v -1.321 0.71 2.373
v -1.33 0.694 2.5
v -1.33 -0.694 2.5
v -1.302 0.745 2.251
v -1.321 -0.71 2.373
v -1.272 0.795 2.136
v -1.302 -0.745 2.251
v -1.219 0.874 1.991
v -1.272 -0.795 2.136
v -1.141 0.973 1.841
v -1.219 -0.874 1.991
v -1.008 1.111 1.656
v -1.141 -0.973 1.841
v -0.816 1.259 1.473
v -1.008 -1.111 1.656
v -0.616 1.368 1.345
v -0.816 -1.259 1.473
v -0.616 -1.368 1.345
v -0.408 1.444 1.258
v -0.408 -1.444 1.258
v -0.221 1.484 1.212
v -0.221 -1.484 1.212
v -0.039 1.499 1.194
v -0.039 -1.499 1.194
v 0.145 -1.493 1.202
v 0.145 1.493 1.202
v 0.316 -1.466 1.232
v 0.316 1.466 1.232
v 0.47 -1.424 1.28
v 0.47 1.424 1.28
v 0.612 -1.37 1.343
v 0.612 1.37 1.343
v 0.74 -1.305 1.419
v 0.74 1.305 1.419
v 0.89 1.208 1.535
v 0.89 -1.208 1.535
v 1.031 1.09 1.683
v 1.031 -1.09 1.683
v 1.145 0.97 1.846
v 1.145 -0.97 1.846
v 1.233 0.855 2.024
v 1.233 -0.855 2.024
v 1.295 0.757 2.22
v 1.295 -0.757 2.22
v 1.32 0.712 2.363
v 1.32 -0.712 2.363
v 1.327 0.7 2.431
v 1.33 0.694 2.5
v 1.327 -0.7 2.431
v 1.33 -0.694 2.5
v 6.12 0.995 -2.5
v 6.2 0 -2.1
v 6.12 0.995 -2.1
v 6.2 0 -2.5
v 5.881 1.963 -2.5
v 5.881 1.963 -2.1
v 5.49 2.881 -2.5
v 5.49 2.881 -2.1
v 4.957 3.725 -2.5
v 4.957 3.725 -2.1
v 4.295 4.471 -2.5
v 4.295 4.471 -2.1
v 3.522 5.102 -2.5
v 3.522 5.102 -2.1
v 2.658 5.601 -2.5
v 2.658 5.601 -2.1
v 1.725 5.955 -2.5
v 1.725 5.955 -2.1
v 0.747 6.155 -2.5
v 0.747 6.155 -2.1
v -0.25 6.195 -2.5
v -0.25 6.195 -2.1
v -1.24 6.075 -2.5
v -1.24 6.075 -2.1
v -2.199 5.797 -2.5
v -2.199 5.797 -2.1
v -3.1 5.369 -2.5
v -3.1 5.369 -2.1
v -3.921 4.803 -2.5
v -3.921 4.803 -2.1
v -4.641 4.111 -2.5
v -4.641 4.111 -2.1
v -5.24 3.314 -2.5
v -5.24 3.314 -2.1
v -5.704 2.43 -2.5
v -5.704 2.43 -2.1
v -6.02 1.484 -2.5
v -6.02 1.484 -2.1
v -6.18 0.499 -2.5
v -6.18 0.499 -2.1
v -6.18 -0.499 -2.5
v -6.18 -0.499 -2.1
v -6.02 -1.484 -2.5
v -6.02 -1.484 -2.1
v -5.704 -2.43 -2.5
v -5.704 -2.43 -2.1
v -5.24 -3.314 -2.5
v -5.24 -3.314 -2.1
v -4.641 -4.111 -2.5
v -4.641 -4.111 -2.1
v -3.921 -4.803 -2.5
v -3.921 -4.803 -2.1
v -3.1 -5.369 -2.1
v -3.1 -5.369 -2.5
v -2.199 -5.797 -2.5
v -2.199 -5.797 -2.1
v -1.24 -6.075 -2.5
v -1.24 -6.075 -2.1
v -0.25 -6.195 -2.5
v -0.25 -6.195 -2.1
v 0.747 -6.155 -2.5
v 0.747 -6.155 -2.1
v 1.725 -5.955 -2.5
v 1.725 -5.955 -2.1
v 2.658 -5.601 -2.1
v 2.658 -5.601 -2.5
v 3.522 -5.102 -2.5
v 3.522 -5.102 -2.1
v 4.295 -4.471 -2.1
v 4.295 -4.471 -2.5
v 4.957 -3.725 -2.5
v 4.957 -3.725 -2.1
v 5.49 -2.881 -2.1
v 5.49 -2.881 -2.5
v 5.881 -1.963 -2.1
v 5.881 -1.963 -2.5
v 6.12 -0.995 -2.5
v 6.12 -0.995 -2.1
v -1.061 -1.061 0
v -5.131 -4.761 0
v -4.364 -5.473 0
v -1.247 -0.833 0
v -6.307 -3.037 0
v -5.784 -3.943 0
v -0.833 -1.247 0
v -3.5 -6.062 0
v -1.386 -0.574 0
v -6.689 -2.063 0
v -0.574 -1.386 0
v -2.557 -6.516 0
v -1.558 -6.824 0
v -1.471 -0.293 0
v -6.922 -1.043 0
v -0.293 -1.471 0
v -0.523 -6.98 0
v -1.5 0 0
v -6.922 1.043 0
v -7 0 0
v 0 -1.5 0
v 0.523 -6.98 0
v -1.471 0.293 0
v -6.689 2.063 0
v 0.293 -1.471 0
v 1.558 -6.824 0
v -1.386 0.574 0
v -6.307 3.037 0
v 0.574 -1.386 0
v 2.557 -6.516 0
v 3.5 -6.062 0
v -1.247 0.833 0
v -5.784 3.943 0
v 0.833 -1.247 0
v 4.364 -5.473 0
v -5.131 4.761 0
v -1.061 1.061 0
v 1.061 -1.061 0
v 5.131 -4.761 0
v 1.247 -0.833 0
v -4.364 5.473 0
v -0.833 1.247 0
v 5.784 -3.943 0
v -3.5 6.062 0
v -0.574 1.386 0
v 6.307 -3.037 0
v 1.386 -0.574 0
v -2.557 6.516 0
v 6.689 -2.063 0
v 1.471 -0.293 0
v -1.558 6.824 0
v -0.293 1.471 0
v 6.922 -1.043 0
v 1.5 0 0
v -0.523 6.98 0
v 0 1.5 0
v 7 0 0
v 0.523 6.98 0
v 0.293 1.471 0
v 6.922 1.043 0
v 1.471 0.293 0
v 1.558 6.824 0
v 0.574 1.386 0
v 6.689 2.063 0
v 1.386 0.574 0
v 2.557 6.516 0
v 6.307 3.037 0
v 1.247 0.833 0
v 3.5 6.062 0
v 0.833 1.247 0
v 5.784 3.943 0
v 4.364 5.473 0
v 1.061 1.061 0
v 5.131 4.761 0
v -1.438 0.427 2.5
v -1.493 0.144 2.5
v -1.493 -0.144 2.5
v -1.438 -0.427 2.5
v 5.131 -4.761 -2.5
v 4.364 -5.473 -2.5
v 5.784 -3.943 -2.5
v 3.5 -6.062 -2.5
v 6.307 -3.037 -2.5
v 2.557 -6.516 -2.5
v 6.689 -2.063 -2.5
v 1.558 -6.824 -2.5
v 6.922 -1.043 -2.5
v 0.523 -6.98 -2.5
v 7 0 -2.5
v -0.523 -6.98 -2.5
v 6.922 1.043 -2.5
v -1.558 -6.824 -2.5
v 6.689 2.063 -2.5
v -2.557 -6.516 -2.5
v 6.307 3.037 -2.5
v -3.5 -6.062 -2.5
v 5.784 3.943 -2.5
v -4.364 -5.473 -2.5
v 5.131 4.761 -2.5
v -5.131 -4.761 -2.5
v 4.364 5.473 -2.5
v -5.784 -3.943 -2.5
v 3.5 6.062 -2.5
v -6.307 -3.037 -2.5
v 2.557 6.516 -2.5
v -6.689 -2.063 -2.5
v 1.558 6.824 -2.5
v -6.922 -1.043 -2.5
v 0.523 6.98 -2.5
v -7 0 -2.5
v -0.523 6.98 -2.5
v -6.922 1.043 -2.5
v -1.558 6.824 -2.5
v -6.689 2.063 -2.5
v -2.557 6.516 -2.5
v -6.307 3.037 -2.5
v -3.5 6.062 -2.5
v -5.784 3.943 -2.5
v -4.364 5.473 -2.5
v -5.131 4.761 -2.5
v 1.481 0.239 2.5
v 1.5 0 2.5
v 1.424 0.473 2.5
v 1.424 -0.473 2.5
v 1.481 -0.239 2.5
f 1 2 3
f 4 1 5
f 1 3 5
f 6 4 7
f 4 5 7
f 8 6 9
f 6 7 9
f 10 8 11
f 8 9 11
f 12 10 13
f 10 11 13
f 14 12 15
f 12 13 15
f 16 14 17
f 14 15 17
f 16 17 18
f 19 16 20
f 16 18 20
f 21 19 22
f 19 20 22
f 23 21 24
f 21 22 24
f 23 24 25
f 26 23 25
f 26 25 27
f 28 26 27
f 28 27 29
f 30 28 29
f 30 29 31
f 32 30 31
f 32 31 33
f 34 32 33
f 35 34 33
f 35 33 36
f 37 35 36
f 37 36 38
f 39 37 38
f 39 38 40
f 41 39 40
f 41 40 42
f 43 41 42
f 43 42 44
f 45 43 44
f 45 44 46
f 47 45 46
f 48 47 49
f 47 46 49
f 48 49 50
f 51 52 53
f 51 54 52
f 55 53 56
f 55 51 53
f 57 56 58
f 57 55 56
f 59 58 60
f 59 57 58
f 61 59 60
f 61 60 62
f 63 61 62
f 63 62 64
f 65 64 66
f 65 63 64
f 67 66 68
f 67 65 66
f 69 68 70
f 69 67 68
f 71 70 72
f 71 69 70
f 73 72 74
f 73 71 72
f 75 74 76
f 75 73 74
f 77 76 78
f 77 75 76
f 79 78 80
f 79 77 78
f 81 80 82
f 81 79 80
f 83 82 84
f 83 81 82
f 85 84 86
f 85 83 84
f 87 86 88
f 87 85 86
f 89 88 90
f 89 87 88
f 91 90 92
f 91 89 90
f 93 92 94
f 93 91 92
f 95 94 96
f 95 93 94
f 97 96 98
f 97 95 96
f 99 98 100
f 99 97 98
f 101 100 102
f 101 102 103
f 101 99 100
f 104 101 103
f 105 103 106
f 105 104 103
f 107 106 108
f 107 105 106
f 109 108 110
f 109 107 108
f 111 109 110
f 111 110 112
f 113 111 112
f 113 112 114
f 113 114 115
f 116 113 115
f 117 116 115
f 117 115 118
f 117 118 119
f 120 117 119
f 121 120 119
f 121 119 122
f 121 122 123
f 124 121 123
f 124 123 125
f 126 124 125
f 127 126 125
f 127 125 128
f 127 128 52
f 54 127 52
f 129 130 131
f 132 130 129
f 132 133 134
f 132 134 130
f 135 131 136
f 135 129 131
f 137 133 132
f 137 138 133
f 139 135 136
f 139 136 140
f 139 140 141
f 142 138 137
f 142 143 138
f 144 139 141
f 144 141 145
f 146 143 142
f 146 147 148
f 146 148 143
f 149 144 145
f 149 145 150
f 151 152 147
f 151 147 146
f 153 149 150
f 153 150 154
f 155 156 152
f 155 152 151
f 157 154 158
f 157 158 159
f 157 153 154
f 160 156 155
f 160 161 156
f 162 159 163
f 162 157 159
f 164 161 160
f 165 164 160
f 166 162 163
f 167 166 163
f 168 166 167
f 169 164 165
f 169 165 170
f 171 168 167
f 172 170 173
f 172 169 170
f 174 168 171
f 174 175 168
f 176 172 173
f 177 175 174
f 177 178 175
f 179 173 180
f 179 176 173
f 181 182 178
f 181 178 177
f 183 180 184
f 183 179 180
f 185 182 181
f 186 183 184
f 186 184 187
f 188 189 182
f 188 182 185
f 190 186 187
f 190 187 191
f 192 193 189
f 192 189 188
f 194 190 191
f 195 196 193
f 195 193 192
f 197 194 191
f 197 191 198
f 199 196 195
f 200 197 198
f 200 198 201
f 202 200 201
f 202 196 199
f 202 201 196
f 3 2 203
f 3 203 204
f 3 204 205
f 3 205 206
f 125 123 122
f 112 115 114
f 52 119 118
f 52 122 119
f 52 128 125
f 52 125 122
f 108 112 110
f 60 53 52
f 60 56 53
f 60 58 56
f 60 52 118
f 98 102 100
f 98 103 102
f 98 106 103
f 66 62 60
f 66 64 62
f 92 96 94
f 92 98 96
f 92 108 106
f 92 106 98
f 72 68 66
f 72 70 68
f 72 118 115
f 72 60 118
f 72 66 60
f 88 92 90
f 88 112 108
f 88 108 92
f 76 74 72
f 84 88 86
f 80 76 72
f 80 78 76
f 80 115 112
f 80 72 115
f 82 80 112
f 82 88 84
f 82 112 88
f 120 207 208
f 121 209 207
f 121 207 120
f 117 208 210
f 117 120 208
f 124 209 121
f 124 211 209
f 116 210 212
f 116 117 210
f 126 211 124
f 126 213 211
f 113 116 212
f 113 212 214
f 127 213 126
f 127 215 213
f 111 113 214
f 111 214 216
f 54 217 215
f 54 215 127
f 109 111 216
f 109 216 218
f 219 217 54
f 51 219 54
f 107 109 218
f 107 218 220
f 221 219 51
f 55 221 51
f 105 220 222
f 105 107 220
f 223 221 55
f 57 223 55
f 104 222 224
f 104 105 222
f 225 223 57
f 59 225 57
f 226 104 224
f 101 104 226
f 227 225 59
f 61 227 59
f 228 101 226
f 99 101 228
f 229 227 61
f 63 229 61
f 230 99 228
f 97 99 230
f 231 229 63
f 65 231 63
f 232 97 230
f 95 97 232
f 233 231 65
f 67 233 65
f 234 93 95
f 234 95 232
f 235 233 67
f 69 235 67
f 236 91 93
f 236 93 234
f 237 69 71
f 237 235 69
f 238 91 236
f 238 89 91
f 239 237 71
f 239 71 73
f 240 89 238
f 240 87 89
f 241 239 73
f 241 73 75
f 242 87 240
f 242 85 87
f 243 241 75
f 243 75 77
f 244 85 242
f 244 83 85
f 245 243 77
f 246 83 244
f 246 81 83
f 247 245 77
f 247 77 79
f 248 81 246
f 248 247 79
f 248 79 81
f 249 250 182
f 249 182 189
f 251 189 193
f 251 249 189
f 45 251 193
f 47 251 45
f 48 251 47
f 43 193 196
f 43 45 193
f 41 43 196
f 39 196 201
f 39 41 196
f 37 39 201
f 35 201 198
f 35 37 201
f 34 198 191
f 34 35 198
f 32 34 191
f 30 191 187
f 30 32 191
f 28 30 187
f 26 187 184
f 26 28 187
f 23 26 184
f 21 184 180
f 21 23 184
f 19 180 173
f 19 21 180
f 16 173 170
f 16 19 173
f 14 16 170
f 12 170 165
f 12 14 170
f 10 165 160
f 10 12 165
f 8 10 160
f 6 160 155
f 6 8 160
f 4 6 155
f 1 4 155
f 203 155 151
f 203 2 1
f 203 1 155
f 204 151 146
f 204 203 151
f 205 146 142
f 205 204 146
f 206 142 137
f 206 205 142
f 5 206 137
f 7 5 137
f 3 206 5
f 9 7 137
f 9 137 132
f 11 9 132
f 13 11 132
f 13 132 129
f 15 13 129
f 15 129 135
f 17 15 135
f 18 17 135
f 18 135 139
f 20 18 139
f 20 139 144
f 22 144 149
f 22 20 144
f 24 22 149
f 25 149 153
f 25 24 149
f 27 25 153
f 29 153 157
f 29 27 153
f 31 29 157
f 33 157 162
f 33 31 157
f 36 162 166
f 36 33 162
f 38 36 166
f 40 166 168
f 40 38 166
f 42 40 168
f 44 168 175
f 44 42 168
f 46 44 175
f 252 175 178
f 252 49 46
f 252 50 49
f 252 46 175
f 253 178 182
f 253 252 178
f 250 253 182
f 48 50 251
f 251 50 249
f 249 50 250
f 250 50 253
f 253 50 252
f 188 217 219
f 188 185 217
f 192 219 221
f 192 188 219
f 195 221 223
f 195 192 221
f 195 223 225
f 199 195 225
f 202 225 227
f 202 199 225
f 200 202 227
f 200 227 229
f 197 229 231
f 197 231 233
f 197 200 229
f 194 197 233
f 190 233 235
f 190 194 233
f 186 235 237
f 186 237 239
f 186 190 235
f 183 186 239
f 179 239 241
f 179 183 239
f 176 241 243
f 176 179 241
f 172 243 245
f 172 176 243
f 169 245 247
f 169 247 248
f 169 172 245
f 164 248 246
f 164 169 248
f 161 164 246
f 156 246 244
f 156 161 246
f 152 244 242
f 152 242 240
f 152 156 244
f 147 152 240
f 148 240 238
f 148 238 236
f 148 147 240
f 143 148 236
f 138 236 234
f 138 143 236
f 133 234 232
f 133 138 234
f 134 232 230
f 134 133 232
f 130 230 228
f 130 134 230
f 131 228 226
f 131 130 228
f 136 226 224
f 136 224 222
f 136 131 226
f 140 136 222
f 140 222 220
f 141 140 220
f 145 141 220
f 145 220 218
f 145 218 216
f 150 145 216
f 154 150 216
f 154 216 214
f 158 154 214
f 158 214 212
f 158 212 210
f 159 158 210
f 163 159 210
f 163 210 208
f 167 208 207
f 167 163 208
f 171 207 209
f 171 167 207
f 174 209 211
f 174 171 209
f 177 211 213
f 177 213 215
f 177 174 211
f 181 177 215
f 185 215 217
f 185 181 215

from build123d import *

# Parameters (mm, degrees)
F2_R     = 1.33
F3_DEPTH = 12.5


with BuildPart() as f1:
    # F0 (on Front) → F1 (revolve)
    with BuildSketch(Plane.XZ):
        Polygon((7, -1.05), (7, 0), (1.5, 0), (1.5, 2.5), (0, 2.5), (0, 0), (0, -2.1), (6.2, -2.1), (6.2, -2.5), (7, -2.5), align=None)
    revolve(axis=Axis((0, 0, 1.25), (0, 0, 1)))

    # F2 (on Front) → F3 (cut, symmetric)
    with BuildSketch(Plane.XZ):
        with Locations((0, 2.523782)):
            Circle(F2_R)
    extrude(amount=F3_DEPTH, both=True, mode=Mode.SUBTRACT)


solid = f1.part
